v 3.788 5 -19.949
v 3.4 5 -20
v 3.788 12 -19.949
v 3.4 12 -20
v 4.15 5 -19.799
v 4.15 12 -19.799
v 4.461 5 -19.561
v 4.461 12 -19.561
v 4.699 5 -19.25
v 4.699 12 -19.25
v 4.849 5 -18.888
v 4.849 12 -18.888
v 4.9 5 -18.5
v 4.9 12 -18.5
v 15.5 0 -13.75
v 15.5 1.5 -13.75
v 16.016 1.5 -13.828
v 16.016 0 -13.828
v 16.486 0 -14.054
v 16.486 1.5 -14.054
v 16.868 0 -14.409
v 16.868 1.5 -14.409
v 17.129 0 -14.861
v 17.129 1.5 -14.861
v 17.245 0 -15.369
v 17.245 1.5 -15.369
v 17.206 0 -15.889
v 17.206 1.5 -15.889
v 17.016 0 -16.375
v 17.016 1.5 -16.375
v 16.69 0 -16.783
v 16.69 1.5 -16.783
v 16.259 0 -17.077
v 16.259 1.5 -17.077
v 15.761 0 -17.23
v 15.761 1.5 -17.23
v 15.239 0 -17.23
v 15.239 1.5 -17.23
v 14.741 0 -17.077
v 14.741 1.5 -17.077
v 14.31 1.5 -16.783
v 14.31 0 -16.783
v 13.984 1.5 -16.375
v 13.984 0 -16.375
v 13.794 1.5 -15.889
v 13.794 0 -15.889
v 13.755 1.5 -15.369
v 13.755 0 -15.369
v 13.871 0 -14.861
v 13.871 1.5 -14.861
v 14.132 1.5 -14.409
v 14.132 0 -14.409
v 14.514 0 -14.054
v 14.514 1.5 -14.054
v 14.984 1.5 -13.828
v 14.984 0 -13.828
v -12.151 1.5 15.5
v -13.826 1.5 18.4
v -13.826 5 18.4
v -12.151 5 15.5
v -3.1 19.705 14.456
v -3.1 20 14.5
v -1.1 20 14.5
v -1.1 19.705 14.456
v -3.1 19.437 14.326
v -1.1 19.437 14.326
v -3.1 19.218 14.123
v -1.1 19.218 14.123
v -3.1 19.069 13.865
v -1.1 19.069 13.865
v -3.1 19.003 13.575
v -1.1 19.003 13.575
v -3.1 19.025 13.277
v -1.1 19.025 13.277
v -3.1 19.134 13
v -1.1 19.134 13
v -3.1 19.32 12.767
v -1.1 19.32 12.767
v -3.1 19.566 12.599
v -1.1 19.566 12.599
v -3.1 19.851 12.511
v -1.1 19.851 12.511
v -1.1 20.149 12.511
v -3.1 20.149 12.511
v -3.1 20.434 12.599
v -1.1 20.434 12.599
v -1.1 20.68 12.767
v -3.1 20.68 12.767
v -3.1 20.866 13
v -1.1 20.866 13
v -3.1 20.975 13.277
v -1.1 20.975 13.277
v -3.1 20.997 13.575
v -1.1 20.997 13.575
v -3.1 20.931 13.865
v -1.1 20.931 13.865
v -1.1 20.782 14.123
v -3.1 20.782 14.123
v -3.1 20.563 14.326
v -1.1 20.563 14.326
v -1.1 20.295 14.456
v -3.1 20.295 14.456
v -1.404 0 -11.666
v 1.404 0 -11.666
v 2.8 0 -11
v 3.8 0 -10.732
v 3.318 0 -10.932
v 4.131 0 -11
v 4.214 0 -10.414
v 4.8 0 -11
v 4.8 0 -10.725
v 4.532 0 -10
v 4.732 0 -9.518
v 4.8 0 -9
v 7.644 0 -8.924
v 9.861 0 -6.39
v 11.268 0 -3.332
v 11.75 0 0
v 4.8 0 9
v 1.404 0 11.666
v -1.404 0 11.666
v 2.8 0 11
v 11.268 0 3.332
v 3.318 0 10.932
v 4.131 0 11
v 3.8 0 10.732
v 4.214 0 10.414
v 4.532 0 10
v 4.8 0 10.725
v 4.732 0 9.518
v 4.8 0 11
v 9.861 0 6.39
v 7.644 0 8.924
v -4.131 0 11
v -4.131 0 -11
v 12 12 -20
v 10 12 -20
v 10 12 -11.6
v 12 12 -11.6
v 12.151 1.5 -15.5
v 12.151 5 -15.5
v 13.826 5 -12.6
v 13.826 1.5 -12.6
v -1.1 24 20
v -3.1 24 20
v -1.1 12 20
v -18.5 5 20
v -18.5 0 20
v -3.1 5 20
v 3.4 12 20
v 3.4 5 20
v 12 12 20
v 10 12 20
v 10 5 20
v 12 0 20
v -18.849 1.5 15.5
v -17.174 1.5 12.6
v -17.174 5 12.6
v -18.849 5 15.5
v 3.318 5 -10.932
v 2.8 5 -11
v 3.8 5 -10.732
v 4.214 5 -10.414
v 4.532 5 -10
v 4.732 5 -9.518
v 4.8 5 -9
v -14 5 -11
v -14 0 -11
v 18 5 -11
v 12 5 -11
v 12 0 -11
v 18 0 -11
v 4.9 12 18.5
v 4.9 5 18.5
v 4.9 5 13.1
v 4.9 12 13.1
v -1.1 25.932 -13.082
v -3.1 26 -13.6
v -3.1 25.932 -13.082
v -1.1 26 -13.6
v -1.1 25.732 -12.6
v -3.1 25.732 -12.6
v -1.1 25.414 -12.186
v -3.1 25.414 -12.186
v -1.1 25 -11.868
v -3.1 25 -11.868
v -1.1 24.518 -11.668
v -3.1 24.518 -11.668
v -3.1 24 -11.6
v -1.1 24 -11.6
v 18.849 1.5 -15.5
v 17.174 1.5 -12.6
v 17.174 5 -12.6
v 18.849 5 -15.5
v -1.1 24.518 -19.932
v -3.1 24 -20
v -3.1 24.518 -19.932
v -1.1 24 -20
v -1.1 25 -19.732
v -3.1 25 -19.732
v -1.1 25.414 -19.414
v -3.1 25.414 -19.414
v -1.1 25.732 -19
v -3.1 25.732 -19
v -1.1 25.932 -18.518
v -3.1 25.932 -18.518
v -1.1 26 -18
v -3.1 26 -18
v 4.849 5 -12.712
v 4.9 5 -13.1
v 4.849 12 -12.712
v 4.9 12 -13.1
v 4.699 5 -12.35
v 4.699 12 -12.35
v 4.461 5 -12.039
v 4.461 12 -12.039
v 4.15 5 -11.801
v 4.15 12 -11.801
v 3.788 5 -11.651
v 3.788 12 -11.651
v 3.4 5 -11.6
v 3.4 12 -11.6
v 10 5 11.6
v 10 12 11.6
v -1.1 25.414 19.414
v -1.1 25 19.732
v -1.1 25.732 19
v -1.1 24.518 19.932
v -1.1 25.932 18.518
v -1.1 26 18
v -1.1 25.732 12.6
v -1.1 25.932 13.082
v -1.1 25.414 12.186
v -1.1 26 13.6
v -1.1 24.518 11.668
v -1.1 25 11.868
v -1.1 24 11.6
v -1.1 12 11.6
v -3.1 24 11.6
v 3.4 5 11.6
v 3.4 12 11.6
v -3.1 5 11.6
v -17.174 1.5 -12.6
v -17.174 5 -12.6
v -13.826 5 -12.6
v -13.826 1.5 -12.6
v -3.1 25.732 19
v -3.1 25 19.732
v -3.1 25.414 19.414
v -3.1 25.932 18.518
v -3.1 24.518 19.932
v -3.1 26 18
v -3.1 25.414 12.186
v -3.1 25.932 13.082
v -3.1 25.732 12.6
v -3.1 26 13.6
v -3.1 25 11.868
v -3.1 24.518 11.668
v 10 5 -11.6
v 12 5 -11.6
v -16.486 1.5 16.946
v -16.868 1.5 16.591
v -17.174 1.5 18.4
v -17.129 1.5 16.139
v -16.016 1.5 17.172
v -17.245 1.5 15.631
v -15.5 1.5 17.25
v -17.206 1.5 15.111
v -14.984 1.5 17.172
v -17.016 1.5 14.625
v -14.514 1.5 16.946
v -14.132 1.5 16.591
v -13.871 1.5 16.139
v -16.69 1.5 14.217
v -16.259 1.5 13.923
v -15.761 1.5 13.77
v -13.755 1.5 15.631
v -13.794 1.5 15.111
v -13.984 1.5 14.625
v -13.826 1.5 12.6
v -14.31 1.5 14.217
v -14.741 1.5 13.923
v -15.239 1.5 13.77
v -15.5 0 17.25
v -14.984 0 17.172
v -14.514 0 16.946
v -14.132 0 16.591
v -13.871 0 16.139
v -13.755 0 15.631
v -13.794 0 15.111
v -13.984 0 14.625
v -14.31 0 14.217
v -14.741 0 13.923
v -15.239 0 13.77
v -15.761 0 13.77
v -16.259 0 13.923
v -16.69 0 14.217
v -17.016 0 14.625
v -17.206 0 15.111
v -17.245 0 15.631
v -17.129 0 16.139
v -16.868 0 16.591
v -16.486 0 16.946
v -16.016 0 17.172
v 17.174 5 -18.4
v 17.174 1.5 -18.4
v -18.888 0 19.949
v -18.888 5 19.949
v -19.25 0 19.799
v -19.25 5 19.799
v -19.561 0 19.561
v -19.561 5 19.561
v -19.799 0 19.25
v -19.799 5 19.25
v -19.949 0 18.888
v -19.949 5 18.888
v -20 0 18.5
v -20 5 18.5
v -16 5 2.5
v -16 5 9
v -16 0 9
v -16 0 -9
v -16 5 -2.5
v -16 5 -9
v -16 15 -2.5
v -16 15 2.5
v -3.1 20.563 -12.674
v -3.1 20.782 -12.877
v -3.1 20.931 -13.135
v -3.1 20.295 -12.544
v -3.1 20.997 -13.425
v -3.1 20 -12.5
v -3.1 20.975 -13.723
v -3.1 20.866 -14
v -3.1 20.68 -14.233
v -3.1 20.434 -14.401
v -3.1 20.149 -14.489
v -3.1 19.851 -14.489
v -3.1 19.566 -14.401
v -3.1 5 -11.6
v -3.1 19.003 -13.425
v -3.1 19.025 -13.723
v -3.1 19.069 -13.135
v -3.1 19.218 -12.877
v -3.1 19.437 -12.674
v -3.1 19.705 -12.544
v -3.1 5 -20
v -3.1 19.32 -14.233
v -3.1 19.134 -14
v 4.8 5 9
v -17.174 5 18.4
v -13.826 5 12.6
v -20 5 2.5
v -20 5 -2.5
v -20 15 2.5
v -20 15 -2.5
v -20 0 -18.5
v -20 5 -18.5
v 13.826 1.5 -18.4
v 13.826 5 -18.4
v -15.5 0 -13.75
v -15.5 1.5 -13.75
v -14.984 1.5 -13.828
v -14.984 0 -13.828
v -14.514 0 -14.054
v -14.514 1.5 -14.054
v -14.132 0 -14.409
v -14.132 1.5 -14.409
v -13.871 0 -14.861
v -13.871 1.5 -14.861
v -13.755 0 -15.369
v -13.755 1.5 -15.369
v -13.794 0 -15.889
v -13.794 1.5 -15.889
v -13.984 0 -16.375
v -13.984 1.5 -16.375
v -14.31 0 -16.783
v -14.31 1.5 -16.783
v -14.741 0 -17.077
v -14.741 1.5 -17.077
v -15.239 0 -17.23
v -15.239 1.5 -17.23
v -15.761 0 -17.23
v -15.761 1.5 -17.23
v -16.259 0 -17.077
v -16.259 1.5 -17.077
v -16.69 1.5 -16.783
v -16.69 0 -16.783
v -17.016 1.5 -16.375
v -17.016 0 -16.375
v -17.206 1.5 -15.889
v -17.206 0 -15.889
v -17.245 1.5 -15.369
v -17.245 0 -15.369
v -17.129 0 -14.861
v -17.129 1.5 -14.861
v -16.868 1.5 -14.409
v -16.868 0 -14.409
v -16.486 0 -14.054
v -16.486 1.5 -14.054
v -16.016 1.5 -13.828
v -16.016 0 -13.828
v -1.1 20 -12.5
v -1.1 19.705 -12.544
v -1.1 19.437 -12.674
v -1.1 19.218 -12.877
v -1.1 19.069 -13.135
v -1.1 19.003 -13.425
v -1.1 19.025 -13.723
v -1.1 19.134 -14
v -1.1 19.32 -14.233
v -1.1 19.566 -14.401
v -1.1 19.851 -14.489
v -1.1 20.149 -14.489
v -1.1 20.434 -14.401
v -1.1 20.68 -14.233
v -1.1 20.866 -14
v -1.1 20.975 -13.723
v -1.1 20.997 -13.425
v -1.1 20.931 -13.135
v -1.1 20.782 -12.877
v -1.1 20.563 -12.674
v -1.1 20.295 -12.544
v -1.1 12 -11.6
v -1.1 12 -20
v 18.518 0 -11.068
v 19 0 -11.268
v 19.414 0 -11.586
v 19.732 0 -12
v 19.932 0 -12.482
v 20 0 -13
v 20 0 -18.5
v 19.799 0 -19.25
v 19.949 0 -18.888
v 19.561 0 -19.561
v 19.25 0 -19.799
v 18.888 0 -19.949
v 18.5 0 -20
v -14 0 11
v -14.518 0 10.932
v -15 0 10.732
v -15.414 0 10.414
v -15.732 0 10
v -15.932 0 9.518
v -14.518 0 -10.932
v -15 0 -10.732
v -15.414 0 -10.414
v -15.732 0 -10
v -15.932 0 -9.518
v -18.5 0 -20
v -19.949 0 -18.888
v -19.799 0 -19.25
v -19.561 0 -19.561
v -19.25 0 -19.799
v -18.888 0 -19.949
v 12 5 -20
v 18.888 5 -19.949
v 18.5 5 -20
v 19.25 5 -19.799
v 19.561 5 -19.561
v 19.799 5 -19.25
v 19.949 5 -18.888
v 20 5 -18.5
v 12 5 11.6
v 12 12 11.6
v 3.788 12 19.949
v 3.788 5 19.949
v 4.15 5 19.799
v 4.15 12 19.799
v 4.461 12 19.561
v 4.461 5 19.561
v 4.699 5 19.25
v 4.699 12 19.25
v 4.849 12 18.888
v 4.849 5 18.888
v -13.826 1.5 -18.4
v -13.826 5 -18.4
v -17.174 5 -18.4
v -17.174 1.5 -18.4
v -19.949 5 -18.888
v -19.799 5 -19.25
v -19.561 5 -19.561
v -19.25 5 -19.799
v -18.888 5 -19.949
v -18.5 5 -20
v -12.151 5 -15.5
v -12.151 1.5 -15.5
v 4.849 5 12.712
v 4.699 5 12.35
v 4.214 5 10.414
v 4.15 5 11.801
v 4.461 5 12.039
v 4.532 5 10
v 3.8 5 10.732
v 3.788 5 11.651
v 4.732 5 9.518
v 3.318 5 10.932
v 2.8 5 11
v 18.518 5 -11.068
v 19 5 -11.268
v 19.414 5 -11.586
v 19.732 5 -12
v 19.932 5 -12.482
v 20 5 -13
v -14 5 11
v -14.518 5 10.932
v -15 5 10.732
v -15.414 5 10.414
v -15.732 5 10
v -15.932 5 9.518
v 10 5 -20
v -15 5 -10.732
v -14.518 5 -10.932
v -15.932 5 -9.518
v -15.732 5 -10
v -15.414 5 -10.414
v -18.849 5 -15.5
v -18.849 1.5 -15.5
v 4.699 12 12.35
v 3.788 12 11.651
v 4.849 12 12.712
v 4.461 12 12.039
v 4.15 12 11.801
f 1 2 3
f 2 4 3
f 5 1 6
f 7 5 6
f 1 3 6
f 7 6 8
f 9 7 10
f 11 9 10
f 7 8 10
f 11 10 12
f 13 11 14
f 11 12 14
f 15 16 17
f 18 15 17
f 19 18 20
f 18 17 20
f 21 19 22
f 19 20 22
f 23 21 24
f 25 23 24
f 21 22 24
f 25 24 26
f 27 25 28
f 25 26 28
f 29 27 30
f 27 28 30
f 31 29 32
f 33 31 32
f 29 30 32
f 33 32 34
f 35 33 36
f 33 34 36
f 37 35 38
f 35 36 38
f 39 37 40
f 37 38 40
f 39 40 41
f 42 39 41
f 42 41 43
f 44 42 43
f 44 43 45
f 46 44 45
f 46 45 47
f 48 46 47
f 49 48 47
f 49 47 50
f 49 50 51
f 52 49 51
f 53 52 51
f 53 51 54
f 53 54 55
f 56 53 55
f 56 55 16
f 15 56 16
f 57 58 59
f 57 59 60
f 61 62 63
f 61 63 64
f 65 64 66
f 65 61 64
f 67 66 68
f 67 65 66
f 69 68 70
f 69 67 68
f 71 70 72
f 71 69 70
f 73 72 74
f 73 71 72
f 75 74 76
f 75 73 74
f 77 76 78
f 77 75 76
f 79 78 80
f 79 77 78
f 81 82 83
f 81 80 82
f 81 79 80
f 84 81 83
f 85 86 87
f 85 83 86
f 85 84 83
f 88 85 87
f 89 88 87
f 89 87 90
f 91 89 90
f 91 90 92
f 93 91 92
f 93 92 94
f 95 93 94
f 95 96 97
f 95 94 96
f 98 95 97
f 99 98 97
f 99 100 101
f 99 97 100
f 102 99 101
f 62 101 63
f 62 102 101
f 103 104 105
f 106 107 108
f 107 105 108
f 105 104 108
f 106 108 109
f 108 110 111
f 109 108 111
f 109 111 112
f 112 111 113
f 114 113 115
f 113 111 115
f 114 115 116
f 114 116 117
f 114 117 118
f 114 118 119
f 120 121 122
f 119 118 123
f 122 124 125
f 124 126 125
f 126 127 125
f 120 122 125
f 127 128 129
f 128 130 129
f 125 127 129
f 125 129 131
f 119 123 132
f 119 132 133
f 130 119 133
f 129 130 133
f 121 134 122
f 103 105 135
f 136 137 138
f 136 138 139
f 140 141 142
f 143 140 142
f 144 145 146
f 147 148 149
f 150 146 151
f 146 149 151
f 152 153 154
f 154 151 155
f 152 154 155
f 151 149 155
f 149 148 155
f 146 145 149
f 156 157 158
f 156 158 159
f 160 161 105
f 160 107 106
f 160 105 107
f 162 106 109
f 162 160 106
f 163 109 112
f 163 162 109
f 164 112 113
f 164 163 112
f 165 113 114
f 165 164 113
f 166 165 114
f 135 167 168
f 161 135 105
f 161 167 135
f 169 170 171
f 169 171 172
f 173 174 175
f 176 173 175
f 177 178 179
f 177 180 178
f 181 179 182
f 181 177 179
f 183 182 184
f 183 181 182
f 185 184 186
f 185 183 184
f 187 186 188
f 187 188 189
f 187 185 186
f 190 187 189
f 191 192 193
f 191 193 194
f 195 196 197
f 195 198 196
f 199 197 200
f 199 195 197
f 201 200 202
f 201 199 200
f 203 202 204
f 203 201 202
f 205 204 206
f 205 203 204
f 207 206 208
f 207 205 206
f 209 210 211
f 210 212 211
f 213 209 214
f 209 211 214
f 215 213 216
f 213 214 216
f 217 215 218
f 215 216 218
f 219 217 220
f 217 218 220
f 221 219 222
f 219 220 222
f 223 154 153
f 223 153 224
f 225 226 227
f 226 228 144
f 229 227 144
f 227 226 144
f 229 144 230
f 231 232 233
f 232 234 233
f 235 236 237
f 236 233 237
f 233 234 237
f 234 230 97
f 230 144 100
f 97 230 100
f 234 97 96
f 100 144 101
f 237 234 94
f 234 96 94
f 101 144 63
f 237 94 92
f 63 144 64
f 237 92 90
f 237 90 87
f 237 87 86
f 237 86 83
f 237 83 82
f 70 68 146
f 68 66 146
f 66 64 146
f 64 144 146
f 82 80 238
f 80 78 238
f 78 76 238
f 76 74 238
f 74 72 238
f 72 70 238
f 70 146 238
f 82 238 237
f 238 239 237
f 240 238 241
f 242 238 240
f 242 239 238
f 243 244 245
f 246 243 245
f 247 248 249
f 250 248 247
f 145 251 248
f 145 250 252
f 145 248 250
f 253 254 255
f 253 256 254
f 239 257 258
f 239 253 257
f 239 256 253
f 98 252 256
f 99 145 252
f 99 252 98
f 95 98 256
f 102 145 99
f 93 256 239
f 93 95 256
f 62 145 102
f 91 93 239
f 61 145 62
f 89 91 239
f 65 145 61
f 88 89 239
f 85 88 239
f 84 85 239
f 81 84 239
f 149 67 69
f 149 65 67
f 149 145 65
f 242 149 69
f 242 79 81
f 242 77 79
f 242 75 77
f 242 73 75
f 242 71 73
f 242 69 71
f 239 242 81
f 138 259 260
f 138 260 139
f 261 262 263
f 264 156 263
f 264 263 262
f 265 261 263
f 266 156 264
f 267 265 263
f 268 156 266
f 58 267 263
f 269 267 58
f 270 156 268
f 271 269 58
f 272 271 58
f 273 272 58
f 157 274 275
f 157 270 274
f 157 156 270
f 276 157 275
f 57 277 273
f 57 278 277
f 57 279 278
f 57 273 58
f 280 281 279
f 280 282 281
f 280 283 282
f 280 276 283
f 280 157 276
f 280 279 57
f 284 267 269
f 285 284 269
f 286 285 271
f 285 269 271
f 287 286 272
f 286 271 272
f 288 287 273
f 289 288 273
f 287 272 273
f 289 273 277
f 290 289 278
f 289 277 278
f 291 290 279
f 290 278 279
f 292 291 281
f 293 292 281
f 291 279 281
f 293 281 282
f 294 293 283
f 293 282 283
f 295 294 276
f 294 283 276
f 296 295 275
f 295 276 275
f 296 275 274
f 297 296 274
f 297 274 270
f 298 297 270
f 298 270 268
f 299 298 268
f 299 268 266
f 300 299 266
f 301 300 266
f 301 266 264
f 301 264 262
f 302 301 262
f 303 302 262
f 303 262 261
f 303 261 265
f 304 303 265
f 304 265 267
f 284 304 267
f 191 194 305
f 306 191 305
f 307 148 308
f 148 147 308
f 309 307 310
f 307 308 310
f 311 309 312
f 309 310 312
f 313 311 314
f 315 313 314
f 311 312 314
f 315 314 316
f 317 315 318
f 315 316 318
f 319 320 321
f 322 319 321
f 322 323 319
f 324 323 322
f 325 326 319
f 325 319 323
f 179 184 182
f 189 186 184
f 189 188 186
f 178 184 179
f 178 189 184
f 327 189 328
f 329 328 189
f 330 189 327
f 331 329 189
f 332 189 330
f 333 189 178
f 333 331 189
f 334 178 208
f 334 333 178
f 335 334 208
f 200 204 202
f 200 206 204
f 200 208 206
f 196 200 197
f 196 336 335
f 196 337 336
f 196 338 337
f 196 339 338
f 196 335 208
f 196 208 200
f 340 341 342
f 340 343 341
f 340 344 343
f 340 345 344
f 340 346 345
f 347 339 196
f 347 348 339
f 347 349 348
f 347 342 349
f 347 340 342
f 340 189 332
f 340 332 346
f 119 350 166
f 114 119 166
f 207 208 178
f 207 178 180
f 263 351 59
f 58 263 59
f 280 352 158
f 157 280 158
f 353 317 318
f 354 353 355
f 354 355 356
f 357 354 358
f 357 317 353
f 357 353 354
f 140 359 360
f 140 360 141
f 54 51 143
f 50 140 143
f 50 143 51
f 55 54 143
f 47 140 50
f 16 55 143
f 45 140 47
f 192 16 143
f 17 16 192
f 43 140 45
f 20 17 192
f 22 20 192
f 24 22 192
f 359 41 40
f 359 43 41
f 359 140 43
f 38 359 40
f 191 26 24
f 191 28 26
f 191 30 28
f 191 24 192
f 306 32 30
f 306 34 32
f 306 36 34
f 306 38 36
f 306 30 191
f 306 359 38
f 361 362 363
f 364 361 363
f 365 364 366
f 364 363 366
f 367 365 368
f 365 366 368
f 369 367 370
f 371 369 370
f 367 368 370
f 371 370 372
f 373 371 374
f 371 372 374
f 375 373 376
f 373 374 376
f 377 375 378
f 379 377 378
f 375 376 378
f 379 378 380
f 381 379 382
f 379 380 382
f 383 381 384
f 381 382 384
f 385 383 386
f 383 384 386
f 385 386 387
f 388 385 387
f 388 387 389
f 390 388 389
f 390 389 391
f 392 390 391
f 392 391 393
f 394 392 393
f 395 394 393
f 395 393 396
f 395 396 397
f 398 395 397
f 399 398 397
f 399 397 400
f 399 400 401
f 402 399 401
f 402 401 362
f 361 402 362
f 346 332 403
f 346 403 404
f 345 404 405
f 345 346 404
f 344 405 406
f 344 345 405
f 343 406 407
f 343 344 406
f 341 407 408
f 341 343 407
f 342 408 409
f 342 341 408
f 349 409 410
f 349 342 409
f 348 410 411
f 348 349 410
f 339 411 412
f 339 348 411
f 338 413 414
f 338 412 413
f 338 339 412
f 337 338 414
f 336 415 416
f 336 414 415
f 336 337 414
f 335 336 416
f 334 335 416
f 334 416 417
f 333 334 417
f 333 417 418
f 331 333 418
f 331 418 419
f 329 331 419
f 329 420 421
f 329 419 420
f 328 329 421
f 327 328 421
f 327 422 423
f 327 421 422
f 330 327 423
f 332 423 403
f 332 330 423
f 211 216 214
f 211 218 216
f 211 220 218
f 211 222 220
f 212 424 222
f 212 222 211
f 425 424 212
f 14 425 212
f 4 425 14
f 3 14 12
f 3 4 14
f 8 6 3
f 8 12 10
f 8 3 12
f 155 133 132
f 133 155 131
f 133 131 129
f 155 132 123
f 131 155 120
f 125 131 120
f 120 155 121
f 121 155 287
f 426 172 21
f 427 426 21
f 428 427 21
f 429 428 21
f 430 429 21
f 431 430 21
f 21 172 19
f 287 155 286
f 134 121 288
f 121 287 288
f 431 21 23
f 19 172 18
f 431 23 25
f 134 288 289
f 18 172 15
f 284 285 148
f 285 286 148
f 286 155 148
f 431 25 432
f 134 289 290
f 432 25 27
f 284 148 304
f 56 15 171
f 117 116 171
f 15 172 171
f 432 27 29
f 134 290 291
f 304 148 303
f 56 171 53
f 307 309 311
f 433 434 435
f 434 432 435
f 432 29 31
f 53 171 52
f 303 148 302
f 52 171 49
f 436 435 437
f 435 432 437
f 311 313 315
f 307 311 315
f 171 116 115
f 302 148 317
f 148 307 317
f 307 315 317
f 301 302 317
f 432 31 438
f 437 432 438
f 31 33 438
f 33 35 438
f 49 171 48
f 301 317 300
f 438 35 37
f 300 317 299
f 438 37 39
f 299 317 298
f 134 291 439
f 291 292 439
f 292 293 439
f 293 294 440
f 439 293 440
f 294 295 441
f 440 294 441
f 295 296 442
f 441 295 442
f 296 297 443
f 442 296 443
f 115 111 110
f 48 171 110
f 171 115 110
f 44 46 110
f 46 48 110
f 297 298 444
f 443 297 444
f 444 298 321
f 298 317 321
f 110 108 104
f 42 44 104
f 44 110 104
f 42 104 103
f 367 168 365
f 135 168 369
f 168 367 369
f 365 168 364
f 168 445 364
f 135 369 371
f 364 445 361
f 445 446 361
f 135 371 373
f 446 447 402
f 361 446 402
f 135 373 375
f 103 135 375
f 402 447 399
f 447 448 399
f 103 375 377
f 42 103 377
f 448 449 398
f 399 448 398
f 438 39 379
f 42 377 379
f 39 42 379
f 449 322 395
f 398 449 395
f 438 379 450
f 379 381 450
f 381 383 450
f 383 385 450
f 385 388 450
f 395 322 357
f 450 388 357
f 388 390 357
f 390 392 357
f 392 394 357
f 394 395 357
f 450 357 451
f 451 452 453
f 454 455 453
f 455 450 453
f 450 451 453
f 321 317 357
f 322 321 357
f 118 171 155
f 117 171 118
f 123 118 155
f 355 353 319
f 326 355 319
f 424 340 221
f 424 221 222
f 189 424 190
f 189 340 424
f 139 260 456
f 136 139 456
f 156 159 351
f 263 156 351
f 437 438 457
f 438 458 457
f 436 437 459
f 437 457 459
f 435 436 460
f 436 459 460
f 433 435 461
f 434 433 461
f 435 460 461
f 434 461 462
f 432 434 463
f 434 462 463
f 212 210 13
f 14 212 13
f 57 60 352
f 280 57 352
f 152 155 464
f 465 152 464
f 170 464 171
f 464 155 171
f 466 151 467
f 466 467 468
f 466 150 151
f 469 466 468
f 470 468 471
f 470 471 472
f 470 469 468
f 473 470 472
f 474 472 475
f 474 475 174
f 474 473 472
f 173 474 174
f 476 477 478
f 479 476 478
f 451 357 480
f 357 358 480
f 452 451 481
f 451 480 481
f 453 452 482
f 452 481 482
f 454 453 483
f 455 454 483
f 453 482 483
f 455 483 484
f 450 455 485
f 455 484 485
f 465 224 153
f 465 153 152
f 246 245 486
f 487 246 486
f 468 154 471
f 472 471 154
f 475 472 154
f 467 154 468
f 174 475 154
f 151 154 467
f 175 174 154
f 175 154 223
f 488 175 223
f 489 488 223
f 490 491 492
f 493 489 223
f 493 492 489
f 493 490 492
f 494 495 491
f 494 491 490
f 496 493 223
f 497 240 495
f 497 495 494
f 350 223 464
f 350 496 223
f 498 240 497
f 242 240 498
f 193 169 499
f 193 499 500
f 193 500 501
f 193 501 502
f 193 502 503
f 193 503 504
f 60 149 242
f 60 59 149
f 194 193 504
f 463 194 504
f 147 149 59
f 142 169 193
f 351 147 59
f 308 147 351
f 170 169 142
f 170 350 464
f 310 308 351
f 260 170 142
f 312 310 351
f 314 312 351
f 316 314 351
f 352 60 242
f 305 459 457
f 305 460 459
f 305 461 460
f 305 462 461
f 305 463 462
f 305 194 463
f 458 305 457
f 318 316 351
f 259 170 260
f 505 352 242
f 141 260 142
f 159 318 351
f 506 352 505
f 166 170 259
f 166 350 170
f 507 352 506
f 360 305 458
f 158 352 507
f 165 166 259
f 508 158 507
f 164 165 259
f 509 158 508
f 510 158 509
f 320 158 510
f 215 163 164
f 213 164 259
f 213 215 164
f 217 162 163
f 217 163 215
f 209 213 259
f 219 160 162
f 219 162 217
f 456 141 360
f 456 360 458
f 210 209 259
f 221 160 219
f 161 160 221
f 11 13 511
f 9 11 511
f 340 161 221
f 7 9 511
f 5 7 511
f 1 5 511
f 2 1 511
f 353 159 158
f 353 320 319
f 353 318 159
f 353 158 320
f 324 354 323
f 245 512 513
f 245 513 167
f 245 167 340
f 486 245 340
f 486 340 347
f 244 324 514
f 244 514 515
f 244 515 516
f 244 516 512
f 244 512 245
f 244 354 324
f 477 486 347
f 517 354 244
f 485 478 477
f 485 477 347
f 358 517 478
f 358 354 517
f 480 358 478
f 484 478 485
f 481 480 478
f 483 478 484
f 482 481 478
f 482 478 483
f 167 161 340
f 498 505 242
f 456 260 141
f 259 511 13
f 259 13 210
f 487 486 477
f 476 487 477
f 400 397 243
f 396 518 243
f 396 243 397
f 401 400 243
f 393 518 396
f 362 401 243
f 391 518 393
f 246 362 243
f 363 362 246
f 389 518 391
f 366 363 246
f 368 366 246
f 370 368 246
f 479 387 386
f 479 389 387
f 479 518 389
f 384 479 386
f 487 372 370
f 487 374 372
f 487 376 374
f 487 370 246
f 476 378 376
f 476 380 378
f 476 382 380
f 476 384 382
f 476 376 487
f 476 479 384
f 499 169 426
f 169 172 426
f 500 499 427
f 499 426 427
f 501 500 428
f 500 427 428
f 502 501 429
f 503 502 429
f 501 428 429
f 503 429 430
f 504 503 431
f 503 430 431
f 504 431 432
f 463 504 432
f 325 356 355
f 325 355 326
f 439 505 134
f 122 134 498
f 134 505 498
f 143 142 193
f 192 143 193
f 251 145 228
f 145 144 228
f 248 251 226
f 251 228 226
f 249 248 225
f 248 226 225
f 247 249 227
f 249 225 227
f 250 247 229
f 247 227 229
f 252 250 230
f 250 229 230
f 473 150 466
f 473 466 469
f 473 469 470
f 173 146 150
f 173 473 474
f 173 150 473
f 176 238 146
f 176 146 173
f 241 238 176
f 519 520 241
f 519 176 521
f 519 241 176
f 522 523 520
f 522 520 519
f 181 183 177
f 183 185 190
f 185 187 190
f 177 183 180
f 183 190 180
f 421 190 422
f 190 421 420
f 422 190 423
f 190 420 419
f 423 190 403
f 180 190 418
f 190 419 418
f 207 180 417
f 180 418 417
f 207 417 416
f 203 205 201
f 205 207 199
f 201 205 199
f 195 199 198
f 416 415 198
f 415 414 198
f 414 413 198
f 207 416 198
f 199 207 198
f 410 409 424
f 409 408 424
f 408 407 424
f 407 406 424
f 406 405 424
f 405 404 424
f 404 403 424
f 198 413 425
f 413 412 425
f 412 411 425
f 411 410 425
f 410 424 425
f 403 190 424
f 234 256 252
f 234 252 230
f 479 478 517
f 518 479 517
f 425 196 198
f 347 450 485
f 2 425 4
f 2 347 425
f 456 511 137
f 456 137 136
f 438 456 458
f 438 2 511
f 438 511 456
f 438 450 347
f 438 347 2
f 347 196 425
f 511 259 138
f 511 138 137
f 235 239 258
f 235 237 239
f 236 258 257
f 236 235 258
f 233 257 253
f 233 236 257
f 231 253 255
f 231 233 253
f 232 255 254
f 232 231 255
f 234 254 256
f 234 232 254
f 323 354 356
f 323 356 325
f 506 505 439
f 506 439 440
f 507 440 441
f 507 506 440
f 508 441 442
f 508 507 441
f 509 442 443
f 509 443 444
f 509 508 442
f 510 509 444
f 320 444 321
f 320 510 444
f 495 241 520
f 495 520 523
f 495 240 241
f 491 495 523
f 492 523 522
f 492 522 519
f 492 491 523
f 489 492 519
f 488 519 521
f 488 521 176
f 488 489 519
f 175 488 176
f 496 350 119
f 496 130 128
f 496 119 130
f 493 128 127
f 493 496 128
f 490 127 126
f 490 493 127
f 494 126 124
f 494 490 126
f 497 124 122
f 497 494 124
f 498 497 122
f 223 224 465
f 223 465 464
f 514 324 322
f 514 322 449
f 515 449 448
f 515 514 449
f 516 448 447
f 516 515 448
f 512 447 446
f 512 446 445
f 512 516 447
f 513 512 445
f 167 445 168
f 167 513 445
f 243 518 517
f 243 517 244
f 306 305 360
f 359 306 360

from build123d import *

# Parameters (mm, degrees)
ESQUISSE1_R                  = 11.75
BOSS_EXTRU_1_DEPTH           = 0.0001
ESQUISSE2_W                  = 40
ESQUISSE2_H                  = 40
BOSS_EXTRU_2_DEPTH           = 5
ENL_V_MAT_EXTRU_1_DEPTH      = 3.5
ESQUISSE4_R                  = 1.75
ENL_V_MAT_EXTRU_2_DEPTH      = 2
ESQUISSE5_W                  = 2
ESQUISSE5_H                  = 40
ESQUISSE5_W_2                = 8
BOSS_EXTRU_3_DEPTH           = 7
ESQUISSE6_W                  = 2
ESQUISSE6_H                  = 40
BOSS_EXTRU_4_DEPTH           = 14
ENL_V_MAT_EXTRU_3_DEPTH      = 14
ENL_V_MAT_EXTRU_3_DEPTH_BACK = 14
ESQUISSE7_R                  = 1
CONG_1_R                     = 2
CONG_2_R                     = 1.5
CONG_3_R                     = 1.5
ESQUISSE10_W                 = 8
ESQUISSE10_H                 = 31
ENL_V_MAT_EXTRU_4_DEPTH      = 10
CONG_4_R                     = 2
ESQUISSE11_W                 = 20.8
ESQUISSE11_H                 = 22
ENL_V_MAT_EXTRU_5_DEPTH      = 10
CONG_5_R                     = 2
ESQUISSE12_W                 = 4
ESQUISSE12_H                 = 5
BOSS_EXTRU_5_DEPTH           = 10


with BuildPart() as part:
    # Esquisse1 → Boss.-Extru.1 (new body)
    with BuildSketch(Plane(origin=(0, 0, 0), x_dir=(1, 0, 0), z_dir=(0, 1, 0))):
        with Locations(Location((0, 0, 0), (0, 0, 270))):
            Circle(ESQUISSE1_R)
    extrude(amount=BOSS_EXTRU_1_DEPTH)

    # Esquisse2 → Boss.-Extru.2 (add)
    with BuildSketch(Plane(origin=(0, 0.0001, 0), x_dir=(1, 0, 0), z_dir=(0, 1, 0))):
        Rectangle(ESQUISSE2_W, ESQUISSE2_H)
    extrude(amount=BOSS_EXTRU_2_DEPTH)

    # Esquisse3 → Enlèv. mat.-Extru.1 (cut)
    with BuildSketch(Plane(origin=(0, 5.0001, 0), x_dir=(1, 0, 0), z_dir=(0, 1, 0))):
        Polygon((-13.825684219, 12.6), (-12.151368439, 15.5), (-13.825684219, 18.4), (-17.174315781, 18.4), (-18.848631561, 15.5), (-17.174315781, 12.6), align=None)
        Polygon((-18.848631561, -15.5), (-17.174315781, -18.4), (-13.825684219, -18.4), (-12.151368439, -15.5), (-13.825684219, -12.6), (-17.174315781, -12.6), align=None)
        Polygon((12.151368439, -15.5), (13.825684219, -18.4), (17.174315781, -18.4), (18.848631561, -15.5), (17.174315781, -12.6), (13.825684219, -12.6), align=None)
        Polygon((13.825684219, 12.6), (17.174315781, 12.6), (18.848631561, 15.5), (17.174315781, 18.4), (13.825684219, 18.4), (12.151368439, 15.5), align=None)
    extrude(amount=-ENL_V_MAT_EXTRU_1_DEPTH, mode=Mode.SUBTRACT)

    # Esquisse4 → Enlèv. mat.-Extru.2 (cut)
    with BuildSketch(Plane(origin=(0, 1.5001, 0), x_dir=(1, 0, 0), z_dir=(0, 1, 0))):
        with Locations(Location((-15.5, 15.5, 0), (0, 0, 270))):
            Circle(ESQUISSE4_R)
        with Locations(Location((15.5, 15.5, 0), (0, 0, 270))):
            Circle(ESQUISSE4_R)
        with Locations(Location((-15.5, -15.5, 0), (0, 0, 270))):
            Circle(ESQUISSE4_R)
        with Locations(Location((15.5, -15.5, 0), (0, 0, 270))):
            Circle(ESQUISSE4_R)
    extrude(amount=-ENL_V_MAT_EXTRU_2_DEPTH, mode=Mode.SUBTRACT)

    # Esquisse5 → Boss.-Extru.3 (add)
    with BuildSketch(Plane(origin=(0, 5.0001, 0), x_dir=(1, 0, 0), z_dir=(0, 1, 0))):
        with Locations((11, 0)):
            Rectangle(ESQUISSE5_W, ESQUISSE5_H)
        with Locations((0.9, 0)):
            Rectangle(ESQUISSE5_W_2, ESQUISSE5_H)
    extrude(amount=BOSS_EXTRU_3_DEPTH)

    # Esquisse6 → Boss.-Extru.4 (add)
    with BuildSketch(Plane(origin=(0, 12.0001, 0), x_dir=(1, 0, 0), z_dir=(0, 1, 0))):
        with Locations((-2.1, 0)):
            Rectangle(ESQUISSE6_W, ESQUISSE6_H)
    extrude(amount=BOSS_EXTRU_4_DEPTH)

    # Esquisse7 → Enlèv. mat.-Extru.3 (cut, two sides: drawn at the far end of the back side and taken through both)
    with BuildSketch(Plane(origin=(-1.1, 0, 0), x_dir=(0, 0, -1), z_dir=(1, 0, 0)).offset(-ENL_V_MAT_EXTRU_3_DEPTH_BACK)):
        with Locations(Location((-13.5, 20.0001, 0), (0, 0, 180))):
            Circle(ESQUISSE7_R)
        with Locations(Location((13.5, 20.0001, 0), (0, 0, 180))):
            Circle(ESQUISSE7_R)
        Polygon((0, 26.0001), (-11.6, 26.0001), (-11.6, 5.0001), (11.6, 5.0001), (11.6, 26.0001), align=None)
    extrude(amount=ENL_V_MAT_EXTRU_3_DEPTH + ENL_V_MAT_EXTRU_3_DEPTH_BACK, mode=Mode.SUBTRACT)

    # Congé1
    cong_1_edges = [part.edges().sort_by_distance(p)[0] for p in [
        (-2.1, 26.0001, 20),
        (-2.1, 26.0001, -20),
        (-2.1, 26.0001, 11.6),
        (-2.1, 26.0001, -11.6),
    ]]
    fillet(cong_1_edges, radius=CONG_1_R)

    # Congé2
    cong_2_edges = [part.edges().sort_by_distance(p)[0] for p in [
        (4.9, 8.5001, 20),
        (4.9, 8.5001, -20),
        (4.9, 8.5001, -11.6),
        (4.9, 8.5001, 11.6),
    ]]
    fillet(cong_2_edges, radius=CONG_2_R)

    # Congé3
    cong_3_edges = [part.edges().sort_by_distance(p)[0] for p in [
        (20, 2.5001, 20),
        (20, 2.5001, -20),
        (-20, 2.5001, -20),
        (-20, 2.5001, 20),
    ]]
    fillet(cong_3_edges, radius=CONG_3_R)

    # Esquisse10 → Enlèv. mat.-Extru.4 (cut)
    with BuildSketch(Plane(origin=(0, 5.0001, 0), x_dir=(1, 0, 0), z_dir=(0, 1, 0))):
        with Locations((16, -4.5)):
            Rectangle(ESQUISSE10_W, ESQUISSE10_H)
    extrude(amount=-ENL_V_MAT_EXTRU_4_DEPTH, mode=Mode.SUBTRACT)

    # Congé4
    cong_4_edges = [part.edges().sort_by_distance(p)[0] for p in [
        (20, 2.5001, -11),
    ]]
    fillet(cong_4_edges, radius=CONG_4_R)

    # Esquisse11 → Enlèv. mat.-Extru.5 (cut)
    with BuildSketch(Plane(origin=(0, 5.0001, 0), x_dir=(1, 0, 0), z_dir=(0, 1, 0))):
        with Locations((-5.6, 0)):
            Rectangle(ESQUISSE11_W, ESQUISSE11_H)
    extrude(amount=-ENL_V_MAT_EXTRU_5_DEPTH, mode=Mode.SUBTRACT)

    # Congé5
    # the kernel refuses this fillet: 2 mm, written as the material it adds along each edge
    with BuildSketch(Plane(origin=(4.8, 5.0001, 11), x_dir=(0, 0, -1), z_dir=(0, -1, 0))) as cong_5_piece_1_section:
        with BuildLine():
            CenterArc((CONG_5_R, -CONG_5_R), CONG_5_R, 90, 90)
            Line((0, -CONG_5_R), (0, 0))
            Line((0, 0), (CONG_5_R, 0))
        make_face()
    cong_5_piece_1 = extrude(amount=10, mode=Mode.PRIVATE)
    cong_5_piece_1 = split(cong_5_piece_1, bisect_by=Plane(origin=(4.313925052, 0, 10.490530882), z_dir=(0, 1, 0)), keep=Keep.TOP, mode=Mode.PRIVATE)
    add(cong_5_piece_1)
    with BuildSketch(Plane(origin=(-16, 5.0001, 11), x_dir=(0, 0, -1), z_dir=(0, -1, 0))) as cong_5_piece_2:
        with BuildLine():
            CenterArc((CONG_5_R, CONG_5_R), CONG_5_R, 180, 90)
            Line((0, CONG_5_R), (0, 0))
            Line((0, 0), (CONG_5_R, 0))
        make_face()
    extrude(amount=5)
    with BuildSketch(Plane(origin=(4.8, 5.0001, -11), x_dir=(-1, 0, 0), z_dir=(0, -1, 0))) as cong_5_piece_3_section:
        with BuildLine():
            CenterArc((CONG_5_R, -CONG_5_R), CONG_5_R, 90, 90)
            Line((0, -CONG_5_R), (0, 0))
            Line((0, 0), (CONG_5_R, 0))
        make_face()
    cong_5_piece_3 = extrude(amount=10, mode=Mode.PRIVATE)
    cong_5_piece_3 = split(cong_5_piece_3, bisect_by=Plane(origin=(4.313925052, 0, -10.490530882), z_dir=(0, 1, 0)), keep=Keep.TOP, mode=Mode.PRIVATE)
    add(cong_5_piece_3)
    with BuildSketch(Plane(origin=(-16, 5.0001, -11), x_dir=(0, 0, 1), z_dir=(0, -1, 0))) as cong_5_piece_4:
        with BuildLine():
            CenterArc((CONG_5_R, -CONG_5_R), CONG_5_R, 90, 90)
            Line((0, -CONG_5_R), (0, 0))
            Line((0, 0), (CONG_5_R, 0))
        make_face()
    extrude(amount=5)

    # Esquisse12 → Boss.-Extru.5 (add)
    with BuildSketch(Plane(origin=(0, 5.0001, 0), x_dir=(1, 0, 0), z_dir=(0, 1, 0))):
        with Locations((-18, 0)):
            Rectangle(ESQUISSE12_W, ESQUISSE12_H)
    extrude(amount=BOSS_EXTRU_5_DEPTH)


solid = part.part
